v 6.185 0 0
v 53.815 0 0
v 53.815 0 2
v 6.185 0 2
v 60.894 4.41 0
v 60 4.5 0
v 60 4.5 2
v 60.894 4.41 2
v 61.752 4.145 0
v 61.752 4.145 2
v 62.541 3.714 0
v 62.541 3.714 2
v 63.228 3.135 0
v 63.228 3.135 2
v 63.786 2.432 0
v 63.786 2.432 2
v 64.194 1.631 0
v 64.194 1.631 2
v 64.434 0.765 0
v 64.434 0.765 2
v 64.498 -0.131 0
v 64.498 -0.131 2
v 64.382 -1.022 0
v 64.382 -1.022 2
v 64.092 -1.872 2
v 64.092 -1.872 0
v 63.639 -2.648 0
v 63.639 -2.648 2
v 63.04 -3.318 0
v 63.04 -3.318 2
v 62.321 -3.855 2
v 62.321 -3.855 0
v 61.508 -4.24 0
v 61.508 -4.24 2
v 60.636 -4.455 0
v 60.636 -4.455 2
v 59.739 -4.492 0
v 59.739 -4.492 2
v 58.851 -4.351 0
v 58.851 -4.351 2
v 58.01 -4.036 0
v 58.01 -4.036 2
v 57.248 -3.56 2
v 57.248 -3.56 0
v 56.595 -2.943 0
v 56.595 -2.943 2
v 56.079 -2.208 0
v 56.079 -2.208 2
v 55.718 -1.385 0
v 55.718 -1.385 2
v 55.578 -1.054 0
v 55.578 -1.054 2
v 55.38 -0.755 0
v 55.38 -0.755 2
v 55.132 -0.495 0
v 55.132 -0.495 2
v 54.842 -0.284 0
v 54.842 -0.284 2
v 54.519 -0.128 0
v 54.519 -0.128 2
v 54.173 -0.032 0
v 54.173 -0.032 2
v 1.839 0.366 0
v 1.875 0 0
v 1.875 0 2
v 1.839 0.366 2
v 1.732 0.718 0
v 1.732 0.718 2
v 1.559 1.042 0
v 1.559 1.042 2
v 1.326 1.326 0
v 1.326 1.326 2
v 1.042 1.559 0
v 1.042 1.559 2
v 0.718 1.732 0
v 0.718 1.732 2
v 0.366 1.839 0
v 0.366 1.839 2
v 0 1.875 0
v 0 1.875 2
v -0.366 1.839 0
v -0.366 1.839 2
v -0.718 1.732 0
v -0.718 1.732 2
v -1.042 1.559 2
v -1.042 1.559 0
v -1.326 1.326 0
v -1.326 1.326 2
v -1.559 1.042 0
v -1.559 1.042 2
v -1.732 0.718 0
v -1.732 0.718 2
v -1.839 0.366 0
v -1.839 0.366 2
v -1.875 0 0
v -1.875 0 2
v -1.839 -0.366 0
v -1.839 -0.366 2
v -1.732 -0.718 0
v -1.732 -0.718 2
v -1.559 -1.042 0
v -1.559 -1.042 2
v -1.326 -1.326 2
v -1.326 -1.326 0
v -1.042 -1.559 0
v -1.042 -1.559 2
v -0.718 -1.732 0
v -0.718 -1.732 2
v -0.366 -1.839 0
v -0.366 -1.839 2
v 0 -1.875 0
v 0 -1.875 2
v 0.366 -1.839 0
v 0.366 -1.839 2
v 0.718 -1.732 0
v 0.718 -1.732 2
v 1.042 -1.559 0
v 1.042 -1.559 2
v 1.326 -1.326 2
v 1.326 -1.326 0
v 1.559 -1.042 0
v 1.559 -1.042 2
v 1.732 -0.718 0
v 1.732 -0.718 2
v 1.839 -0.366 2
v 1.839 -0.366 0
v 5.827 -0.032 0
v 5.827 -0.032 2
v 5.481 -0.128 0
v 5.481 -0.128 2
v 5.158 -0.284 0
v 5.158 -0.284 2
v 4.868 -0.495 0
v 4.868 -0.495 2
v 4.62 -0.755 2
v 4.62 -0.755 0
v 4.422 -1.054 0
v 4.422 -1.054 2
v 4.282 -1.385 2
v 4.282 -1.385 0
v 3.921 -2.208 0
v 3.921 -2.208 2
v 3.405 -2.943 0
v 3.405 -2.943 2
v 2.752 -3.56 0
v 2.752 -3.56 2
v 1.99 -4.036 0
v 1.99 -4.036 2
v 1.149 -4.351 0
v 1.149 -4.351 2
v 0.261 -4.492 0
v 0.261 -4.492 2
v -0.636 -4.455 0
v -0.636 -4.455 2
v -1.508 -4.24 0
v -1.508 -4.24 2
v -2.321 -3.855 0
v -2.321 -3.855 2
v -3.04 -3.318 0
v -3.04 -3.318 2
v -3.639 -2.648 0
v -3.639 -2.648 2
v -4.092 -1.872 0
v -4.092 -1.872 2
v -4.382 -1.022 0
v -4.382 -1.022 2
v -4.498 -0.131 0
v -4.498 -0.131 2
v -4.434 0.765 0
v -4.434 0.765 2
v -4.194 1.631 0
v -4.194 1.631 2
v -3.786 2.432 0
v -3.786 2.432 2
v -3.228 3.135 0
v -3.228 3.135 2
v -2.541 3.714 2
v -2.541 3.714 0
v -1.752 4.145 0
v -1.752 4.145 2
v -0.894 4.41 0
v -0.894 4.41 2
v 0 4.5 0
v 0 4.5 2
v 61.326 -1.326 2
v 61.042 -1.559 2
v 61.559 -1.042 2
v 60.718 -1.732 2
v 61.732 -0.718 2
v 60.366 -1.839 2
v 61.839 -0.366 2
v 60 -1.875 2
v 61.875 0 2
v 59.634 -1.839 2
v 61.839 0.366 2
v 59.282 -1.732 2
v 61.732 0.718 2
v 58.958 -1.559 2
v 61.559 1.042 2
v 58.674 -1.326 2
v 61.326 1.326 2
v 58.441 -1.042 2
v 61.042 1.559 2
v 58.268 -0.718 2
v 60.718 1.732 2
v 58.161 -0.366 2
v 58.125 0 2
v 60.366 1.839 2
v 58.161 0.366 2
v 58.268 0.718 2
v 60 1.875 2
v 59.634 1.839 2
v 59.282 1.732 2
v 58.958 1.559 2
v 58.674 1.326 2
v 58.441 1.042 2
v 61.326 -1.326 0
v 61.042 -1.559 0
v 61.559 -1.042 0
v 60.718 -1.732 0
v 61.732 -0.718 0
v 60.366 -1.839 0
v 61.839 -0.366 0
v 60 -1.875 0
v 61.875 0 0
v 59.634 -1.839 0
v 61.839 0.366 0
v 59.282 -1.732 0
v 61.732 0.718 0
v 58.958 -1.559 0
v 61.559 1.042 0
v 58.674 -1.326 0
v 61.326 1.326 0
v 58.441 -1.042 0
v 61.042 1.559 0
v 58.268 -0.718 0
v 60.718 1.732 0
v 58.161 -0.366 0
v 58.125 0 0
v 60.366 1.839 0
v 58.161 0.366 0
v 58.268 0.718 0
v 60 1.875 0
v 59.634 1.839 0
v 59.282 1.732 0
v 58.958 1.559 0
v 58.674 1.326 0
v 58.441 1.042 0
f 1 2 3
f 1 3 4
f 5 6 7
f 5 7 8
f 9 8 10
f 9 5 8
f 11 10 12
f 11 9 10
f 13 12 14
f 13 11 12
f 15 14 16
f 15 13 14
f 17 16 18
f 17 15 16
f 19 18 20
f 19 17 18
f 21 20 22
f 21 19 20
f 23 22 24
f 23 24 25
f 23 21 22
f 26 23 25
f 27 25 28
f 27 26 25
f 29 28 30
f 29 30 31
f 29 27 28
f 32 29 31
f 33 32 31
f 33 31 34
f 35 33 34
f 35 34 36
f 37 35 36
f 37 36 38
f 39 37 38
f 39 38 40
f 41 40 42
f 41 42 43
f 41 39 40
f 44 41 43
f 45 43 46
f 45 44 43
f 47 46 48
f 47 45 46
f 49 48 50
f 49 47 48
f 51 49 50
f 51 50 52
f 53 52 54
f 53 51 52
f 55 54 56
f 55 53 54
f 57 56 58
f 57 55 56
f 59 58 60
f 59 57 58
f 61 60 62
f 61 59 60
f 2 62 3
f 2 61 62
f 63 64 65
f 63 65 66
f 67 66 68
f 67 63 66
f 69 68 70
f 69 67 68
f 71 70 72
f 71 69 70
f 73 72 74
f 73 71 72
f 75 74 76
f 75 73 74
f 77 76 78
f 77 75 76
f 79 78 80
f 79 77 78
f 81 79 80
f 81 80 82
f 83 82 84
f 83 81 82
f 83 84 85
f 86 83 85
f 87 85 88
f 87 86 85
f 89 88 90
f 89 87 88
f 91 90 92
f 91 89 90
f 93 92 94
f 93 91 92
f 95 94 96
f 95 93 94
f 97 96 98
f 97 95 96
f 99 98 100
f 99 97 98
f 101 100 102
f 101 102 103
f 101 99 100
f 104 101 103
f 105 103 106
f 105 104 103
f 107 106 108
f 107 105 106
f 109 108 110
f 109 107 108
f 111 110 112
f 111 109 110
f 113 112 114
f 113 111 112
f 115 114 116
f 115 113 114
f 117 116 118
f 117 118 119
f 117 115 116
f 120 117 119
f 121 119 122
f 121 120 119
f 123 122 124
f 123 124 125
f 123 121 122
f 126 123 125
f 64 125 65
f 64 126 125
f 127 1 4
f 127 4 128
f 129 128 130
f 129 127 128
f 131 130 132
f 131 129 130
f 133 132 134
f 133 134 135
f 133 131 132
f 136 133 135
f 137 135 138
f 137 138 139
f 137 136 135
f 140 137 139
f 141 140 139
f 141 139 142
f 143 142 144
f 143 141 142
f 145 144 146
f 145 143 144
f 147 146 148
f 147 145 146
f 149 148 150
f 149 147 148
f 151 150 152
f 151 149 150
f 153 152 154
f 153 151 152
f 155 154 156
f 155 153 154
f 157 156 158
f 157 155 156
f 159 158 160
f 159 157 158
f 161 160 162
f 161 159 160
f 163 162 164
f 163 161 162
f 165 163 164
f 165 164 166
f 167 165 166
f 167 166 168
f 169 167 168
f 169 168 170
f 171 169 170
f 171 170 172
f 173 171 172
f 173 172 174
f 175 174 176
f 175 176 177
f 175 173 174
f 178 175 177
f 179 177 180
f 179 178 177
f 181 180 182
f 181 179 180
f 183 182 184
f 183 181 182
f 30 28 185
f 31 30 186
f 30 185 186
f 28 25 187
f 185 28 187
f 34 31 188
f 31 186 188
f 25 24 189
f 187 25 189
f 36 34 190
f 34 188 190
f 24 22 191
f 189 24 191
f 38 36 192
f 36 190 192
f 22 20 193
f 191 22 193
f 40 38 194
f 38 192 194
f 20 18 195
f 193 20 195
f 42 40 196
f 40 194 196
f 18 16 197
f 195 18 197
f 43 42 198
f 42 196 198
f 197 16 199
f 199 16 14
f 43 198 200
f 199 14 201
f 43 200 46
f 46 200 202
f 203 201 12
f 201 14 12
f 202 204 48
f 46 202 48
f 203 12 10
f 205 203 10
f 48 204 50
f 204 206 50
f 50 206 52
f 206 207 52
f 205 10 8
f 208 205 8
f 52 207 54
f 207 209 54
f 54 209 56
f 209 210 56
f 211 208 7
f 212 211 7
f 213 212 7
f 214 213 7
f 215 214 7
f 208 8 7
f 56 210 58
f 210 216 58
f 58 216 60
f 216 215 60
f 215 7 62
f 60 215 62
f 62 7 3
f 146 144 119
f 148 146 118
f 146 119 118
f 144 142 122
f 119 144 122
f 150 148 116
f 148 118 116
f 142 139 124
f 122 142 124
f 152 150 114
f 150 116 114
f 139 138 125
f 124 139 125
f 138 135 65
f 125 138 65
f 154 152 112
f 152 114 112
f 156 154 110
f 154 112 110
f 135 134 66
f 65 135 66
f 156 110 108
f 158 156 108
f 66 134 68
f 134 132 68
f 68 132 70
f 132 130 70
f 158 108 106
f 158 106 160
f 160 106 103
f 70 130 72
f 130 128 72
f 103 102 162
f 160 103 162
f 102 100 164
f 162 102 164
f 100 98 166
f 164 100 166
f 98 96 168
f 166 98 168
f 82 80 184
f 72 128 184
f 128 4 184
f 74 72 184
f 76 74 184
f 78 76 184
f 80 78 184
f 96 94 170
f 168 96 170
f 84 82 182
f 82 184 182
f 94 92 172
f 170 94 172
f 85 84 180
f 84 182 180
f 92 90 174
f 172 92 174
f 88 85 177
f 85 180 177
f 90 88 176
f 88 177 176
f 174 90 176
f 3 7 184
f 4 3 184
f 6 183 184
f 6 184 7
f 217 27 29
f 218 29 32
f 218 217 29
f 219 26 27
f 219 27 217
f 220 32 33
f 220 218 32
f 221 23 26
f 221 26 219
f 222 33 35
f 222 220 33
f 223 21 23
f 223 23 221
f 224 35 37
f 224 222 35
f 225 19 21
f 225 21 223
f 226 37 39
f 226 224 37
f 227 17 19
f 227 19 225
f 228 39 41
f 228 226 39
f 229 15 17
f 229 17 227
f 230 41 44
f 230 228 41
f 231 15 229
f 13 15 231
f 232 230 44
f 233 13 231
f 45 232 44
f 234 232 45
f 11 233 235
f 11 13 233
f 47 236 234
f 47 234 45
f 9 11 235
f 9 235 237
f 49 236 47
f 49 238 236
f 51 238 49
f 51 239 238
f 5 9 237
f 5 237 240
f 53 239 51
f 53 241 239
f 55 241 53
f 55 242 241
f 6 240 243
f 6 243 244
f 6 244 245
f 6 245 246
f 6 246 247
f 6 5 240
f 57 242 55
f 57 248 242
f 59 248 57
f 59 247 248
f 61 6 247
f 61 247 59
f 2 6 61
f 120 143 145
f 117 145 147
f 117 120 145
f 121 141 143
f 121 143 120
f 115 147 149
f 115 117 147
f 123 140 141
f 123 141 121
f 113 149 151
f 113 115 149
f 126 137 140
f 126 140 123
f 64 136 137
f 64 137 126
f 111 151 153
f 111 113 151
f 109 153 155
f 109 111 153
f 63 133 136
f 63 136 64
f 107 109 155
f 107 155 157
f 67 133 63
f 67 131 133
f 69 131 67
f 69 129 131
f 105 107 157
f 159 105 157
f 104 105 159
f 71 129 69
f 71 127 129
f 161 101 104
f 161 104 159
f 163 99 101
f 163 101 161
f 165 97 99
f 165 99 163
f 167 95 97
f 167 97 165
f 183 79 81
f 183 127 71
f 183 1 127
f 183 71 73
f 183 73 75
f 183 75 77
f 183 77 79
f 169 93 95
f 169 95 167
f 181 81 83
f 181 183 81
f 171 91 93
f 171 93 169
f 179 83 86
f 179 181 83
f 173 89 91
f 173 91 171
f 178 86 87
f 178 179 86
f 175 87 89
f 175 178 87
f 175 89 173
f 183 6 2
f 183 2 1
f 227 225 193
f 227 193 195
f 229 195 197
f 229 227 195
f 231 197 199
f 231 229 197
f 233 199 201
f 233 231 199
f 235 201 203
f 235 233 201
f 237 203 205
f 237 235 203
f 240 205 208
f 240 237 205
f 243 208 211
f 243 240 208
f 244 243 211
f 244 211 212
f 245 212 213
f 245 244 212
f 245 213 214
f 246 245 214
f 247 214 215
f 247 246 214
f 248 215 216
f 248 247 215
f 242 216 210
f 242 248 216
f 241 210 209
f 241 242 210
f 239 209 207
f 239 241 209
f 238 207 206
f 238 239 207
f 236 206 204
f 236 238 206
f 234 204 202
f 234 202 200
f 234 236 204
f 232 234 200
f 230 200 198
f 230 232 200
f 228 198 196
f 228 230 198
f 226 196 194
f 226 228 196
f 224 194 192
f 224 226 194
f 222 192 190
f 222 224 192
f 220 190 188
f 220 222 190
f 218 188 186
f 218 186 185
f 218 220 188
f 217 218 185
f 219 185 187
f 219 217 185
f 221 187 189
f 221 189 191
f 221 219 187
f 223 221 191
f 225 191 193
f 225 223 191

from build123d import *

# Parameters (mm, degrees)
SKETCH1_R           = 1.875
BOSS_EXTRUDE1_DEPTH = 2


with BuildPart() as part:
    # Sketch1 → Boss-Extrude1 (new body)
    with BuildSketch(Plane.XY):
        with BuildLine():
            Line((0, 4.5), (60, 4.5))
            ThreePointArc((60, 4.5), (63.63873393, -2.647567824), (55.718313389, -1.384615385))
            ThreePointArc((55.718313389, -1.384615385), (54.992038372, -0.38278492), (53.815341562, 0))
            Line((53.815341562, 0), (6.184658438, 0))
            ThreePointArc((6.184658438, 0), (5.007961628, -0.38278492), (4.281686611, -1.384615385))
            ThreePointArc((4.281686611, -1.384615385), (-3.63873393, -2.647567824), (0, 4.5))
        make_face()
        Circle(SKETCH1_R, mode=Mode.SUBTRACT)
        with Locations((60, 0)):
            Circle(SKETCH1_R, mode=Mode.SUBTRACT)
    extrude(amount=BOSS_EXTRUDE1_DEPTH)


solid = part.part
